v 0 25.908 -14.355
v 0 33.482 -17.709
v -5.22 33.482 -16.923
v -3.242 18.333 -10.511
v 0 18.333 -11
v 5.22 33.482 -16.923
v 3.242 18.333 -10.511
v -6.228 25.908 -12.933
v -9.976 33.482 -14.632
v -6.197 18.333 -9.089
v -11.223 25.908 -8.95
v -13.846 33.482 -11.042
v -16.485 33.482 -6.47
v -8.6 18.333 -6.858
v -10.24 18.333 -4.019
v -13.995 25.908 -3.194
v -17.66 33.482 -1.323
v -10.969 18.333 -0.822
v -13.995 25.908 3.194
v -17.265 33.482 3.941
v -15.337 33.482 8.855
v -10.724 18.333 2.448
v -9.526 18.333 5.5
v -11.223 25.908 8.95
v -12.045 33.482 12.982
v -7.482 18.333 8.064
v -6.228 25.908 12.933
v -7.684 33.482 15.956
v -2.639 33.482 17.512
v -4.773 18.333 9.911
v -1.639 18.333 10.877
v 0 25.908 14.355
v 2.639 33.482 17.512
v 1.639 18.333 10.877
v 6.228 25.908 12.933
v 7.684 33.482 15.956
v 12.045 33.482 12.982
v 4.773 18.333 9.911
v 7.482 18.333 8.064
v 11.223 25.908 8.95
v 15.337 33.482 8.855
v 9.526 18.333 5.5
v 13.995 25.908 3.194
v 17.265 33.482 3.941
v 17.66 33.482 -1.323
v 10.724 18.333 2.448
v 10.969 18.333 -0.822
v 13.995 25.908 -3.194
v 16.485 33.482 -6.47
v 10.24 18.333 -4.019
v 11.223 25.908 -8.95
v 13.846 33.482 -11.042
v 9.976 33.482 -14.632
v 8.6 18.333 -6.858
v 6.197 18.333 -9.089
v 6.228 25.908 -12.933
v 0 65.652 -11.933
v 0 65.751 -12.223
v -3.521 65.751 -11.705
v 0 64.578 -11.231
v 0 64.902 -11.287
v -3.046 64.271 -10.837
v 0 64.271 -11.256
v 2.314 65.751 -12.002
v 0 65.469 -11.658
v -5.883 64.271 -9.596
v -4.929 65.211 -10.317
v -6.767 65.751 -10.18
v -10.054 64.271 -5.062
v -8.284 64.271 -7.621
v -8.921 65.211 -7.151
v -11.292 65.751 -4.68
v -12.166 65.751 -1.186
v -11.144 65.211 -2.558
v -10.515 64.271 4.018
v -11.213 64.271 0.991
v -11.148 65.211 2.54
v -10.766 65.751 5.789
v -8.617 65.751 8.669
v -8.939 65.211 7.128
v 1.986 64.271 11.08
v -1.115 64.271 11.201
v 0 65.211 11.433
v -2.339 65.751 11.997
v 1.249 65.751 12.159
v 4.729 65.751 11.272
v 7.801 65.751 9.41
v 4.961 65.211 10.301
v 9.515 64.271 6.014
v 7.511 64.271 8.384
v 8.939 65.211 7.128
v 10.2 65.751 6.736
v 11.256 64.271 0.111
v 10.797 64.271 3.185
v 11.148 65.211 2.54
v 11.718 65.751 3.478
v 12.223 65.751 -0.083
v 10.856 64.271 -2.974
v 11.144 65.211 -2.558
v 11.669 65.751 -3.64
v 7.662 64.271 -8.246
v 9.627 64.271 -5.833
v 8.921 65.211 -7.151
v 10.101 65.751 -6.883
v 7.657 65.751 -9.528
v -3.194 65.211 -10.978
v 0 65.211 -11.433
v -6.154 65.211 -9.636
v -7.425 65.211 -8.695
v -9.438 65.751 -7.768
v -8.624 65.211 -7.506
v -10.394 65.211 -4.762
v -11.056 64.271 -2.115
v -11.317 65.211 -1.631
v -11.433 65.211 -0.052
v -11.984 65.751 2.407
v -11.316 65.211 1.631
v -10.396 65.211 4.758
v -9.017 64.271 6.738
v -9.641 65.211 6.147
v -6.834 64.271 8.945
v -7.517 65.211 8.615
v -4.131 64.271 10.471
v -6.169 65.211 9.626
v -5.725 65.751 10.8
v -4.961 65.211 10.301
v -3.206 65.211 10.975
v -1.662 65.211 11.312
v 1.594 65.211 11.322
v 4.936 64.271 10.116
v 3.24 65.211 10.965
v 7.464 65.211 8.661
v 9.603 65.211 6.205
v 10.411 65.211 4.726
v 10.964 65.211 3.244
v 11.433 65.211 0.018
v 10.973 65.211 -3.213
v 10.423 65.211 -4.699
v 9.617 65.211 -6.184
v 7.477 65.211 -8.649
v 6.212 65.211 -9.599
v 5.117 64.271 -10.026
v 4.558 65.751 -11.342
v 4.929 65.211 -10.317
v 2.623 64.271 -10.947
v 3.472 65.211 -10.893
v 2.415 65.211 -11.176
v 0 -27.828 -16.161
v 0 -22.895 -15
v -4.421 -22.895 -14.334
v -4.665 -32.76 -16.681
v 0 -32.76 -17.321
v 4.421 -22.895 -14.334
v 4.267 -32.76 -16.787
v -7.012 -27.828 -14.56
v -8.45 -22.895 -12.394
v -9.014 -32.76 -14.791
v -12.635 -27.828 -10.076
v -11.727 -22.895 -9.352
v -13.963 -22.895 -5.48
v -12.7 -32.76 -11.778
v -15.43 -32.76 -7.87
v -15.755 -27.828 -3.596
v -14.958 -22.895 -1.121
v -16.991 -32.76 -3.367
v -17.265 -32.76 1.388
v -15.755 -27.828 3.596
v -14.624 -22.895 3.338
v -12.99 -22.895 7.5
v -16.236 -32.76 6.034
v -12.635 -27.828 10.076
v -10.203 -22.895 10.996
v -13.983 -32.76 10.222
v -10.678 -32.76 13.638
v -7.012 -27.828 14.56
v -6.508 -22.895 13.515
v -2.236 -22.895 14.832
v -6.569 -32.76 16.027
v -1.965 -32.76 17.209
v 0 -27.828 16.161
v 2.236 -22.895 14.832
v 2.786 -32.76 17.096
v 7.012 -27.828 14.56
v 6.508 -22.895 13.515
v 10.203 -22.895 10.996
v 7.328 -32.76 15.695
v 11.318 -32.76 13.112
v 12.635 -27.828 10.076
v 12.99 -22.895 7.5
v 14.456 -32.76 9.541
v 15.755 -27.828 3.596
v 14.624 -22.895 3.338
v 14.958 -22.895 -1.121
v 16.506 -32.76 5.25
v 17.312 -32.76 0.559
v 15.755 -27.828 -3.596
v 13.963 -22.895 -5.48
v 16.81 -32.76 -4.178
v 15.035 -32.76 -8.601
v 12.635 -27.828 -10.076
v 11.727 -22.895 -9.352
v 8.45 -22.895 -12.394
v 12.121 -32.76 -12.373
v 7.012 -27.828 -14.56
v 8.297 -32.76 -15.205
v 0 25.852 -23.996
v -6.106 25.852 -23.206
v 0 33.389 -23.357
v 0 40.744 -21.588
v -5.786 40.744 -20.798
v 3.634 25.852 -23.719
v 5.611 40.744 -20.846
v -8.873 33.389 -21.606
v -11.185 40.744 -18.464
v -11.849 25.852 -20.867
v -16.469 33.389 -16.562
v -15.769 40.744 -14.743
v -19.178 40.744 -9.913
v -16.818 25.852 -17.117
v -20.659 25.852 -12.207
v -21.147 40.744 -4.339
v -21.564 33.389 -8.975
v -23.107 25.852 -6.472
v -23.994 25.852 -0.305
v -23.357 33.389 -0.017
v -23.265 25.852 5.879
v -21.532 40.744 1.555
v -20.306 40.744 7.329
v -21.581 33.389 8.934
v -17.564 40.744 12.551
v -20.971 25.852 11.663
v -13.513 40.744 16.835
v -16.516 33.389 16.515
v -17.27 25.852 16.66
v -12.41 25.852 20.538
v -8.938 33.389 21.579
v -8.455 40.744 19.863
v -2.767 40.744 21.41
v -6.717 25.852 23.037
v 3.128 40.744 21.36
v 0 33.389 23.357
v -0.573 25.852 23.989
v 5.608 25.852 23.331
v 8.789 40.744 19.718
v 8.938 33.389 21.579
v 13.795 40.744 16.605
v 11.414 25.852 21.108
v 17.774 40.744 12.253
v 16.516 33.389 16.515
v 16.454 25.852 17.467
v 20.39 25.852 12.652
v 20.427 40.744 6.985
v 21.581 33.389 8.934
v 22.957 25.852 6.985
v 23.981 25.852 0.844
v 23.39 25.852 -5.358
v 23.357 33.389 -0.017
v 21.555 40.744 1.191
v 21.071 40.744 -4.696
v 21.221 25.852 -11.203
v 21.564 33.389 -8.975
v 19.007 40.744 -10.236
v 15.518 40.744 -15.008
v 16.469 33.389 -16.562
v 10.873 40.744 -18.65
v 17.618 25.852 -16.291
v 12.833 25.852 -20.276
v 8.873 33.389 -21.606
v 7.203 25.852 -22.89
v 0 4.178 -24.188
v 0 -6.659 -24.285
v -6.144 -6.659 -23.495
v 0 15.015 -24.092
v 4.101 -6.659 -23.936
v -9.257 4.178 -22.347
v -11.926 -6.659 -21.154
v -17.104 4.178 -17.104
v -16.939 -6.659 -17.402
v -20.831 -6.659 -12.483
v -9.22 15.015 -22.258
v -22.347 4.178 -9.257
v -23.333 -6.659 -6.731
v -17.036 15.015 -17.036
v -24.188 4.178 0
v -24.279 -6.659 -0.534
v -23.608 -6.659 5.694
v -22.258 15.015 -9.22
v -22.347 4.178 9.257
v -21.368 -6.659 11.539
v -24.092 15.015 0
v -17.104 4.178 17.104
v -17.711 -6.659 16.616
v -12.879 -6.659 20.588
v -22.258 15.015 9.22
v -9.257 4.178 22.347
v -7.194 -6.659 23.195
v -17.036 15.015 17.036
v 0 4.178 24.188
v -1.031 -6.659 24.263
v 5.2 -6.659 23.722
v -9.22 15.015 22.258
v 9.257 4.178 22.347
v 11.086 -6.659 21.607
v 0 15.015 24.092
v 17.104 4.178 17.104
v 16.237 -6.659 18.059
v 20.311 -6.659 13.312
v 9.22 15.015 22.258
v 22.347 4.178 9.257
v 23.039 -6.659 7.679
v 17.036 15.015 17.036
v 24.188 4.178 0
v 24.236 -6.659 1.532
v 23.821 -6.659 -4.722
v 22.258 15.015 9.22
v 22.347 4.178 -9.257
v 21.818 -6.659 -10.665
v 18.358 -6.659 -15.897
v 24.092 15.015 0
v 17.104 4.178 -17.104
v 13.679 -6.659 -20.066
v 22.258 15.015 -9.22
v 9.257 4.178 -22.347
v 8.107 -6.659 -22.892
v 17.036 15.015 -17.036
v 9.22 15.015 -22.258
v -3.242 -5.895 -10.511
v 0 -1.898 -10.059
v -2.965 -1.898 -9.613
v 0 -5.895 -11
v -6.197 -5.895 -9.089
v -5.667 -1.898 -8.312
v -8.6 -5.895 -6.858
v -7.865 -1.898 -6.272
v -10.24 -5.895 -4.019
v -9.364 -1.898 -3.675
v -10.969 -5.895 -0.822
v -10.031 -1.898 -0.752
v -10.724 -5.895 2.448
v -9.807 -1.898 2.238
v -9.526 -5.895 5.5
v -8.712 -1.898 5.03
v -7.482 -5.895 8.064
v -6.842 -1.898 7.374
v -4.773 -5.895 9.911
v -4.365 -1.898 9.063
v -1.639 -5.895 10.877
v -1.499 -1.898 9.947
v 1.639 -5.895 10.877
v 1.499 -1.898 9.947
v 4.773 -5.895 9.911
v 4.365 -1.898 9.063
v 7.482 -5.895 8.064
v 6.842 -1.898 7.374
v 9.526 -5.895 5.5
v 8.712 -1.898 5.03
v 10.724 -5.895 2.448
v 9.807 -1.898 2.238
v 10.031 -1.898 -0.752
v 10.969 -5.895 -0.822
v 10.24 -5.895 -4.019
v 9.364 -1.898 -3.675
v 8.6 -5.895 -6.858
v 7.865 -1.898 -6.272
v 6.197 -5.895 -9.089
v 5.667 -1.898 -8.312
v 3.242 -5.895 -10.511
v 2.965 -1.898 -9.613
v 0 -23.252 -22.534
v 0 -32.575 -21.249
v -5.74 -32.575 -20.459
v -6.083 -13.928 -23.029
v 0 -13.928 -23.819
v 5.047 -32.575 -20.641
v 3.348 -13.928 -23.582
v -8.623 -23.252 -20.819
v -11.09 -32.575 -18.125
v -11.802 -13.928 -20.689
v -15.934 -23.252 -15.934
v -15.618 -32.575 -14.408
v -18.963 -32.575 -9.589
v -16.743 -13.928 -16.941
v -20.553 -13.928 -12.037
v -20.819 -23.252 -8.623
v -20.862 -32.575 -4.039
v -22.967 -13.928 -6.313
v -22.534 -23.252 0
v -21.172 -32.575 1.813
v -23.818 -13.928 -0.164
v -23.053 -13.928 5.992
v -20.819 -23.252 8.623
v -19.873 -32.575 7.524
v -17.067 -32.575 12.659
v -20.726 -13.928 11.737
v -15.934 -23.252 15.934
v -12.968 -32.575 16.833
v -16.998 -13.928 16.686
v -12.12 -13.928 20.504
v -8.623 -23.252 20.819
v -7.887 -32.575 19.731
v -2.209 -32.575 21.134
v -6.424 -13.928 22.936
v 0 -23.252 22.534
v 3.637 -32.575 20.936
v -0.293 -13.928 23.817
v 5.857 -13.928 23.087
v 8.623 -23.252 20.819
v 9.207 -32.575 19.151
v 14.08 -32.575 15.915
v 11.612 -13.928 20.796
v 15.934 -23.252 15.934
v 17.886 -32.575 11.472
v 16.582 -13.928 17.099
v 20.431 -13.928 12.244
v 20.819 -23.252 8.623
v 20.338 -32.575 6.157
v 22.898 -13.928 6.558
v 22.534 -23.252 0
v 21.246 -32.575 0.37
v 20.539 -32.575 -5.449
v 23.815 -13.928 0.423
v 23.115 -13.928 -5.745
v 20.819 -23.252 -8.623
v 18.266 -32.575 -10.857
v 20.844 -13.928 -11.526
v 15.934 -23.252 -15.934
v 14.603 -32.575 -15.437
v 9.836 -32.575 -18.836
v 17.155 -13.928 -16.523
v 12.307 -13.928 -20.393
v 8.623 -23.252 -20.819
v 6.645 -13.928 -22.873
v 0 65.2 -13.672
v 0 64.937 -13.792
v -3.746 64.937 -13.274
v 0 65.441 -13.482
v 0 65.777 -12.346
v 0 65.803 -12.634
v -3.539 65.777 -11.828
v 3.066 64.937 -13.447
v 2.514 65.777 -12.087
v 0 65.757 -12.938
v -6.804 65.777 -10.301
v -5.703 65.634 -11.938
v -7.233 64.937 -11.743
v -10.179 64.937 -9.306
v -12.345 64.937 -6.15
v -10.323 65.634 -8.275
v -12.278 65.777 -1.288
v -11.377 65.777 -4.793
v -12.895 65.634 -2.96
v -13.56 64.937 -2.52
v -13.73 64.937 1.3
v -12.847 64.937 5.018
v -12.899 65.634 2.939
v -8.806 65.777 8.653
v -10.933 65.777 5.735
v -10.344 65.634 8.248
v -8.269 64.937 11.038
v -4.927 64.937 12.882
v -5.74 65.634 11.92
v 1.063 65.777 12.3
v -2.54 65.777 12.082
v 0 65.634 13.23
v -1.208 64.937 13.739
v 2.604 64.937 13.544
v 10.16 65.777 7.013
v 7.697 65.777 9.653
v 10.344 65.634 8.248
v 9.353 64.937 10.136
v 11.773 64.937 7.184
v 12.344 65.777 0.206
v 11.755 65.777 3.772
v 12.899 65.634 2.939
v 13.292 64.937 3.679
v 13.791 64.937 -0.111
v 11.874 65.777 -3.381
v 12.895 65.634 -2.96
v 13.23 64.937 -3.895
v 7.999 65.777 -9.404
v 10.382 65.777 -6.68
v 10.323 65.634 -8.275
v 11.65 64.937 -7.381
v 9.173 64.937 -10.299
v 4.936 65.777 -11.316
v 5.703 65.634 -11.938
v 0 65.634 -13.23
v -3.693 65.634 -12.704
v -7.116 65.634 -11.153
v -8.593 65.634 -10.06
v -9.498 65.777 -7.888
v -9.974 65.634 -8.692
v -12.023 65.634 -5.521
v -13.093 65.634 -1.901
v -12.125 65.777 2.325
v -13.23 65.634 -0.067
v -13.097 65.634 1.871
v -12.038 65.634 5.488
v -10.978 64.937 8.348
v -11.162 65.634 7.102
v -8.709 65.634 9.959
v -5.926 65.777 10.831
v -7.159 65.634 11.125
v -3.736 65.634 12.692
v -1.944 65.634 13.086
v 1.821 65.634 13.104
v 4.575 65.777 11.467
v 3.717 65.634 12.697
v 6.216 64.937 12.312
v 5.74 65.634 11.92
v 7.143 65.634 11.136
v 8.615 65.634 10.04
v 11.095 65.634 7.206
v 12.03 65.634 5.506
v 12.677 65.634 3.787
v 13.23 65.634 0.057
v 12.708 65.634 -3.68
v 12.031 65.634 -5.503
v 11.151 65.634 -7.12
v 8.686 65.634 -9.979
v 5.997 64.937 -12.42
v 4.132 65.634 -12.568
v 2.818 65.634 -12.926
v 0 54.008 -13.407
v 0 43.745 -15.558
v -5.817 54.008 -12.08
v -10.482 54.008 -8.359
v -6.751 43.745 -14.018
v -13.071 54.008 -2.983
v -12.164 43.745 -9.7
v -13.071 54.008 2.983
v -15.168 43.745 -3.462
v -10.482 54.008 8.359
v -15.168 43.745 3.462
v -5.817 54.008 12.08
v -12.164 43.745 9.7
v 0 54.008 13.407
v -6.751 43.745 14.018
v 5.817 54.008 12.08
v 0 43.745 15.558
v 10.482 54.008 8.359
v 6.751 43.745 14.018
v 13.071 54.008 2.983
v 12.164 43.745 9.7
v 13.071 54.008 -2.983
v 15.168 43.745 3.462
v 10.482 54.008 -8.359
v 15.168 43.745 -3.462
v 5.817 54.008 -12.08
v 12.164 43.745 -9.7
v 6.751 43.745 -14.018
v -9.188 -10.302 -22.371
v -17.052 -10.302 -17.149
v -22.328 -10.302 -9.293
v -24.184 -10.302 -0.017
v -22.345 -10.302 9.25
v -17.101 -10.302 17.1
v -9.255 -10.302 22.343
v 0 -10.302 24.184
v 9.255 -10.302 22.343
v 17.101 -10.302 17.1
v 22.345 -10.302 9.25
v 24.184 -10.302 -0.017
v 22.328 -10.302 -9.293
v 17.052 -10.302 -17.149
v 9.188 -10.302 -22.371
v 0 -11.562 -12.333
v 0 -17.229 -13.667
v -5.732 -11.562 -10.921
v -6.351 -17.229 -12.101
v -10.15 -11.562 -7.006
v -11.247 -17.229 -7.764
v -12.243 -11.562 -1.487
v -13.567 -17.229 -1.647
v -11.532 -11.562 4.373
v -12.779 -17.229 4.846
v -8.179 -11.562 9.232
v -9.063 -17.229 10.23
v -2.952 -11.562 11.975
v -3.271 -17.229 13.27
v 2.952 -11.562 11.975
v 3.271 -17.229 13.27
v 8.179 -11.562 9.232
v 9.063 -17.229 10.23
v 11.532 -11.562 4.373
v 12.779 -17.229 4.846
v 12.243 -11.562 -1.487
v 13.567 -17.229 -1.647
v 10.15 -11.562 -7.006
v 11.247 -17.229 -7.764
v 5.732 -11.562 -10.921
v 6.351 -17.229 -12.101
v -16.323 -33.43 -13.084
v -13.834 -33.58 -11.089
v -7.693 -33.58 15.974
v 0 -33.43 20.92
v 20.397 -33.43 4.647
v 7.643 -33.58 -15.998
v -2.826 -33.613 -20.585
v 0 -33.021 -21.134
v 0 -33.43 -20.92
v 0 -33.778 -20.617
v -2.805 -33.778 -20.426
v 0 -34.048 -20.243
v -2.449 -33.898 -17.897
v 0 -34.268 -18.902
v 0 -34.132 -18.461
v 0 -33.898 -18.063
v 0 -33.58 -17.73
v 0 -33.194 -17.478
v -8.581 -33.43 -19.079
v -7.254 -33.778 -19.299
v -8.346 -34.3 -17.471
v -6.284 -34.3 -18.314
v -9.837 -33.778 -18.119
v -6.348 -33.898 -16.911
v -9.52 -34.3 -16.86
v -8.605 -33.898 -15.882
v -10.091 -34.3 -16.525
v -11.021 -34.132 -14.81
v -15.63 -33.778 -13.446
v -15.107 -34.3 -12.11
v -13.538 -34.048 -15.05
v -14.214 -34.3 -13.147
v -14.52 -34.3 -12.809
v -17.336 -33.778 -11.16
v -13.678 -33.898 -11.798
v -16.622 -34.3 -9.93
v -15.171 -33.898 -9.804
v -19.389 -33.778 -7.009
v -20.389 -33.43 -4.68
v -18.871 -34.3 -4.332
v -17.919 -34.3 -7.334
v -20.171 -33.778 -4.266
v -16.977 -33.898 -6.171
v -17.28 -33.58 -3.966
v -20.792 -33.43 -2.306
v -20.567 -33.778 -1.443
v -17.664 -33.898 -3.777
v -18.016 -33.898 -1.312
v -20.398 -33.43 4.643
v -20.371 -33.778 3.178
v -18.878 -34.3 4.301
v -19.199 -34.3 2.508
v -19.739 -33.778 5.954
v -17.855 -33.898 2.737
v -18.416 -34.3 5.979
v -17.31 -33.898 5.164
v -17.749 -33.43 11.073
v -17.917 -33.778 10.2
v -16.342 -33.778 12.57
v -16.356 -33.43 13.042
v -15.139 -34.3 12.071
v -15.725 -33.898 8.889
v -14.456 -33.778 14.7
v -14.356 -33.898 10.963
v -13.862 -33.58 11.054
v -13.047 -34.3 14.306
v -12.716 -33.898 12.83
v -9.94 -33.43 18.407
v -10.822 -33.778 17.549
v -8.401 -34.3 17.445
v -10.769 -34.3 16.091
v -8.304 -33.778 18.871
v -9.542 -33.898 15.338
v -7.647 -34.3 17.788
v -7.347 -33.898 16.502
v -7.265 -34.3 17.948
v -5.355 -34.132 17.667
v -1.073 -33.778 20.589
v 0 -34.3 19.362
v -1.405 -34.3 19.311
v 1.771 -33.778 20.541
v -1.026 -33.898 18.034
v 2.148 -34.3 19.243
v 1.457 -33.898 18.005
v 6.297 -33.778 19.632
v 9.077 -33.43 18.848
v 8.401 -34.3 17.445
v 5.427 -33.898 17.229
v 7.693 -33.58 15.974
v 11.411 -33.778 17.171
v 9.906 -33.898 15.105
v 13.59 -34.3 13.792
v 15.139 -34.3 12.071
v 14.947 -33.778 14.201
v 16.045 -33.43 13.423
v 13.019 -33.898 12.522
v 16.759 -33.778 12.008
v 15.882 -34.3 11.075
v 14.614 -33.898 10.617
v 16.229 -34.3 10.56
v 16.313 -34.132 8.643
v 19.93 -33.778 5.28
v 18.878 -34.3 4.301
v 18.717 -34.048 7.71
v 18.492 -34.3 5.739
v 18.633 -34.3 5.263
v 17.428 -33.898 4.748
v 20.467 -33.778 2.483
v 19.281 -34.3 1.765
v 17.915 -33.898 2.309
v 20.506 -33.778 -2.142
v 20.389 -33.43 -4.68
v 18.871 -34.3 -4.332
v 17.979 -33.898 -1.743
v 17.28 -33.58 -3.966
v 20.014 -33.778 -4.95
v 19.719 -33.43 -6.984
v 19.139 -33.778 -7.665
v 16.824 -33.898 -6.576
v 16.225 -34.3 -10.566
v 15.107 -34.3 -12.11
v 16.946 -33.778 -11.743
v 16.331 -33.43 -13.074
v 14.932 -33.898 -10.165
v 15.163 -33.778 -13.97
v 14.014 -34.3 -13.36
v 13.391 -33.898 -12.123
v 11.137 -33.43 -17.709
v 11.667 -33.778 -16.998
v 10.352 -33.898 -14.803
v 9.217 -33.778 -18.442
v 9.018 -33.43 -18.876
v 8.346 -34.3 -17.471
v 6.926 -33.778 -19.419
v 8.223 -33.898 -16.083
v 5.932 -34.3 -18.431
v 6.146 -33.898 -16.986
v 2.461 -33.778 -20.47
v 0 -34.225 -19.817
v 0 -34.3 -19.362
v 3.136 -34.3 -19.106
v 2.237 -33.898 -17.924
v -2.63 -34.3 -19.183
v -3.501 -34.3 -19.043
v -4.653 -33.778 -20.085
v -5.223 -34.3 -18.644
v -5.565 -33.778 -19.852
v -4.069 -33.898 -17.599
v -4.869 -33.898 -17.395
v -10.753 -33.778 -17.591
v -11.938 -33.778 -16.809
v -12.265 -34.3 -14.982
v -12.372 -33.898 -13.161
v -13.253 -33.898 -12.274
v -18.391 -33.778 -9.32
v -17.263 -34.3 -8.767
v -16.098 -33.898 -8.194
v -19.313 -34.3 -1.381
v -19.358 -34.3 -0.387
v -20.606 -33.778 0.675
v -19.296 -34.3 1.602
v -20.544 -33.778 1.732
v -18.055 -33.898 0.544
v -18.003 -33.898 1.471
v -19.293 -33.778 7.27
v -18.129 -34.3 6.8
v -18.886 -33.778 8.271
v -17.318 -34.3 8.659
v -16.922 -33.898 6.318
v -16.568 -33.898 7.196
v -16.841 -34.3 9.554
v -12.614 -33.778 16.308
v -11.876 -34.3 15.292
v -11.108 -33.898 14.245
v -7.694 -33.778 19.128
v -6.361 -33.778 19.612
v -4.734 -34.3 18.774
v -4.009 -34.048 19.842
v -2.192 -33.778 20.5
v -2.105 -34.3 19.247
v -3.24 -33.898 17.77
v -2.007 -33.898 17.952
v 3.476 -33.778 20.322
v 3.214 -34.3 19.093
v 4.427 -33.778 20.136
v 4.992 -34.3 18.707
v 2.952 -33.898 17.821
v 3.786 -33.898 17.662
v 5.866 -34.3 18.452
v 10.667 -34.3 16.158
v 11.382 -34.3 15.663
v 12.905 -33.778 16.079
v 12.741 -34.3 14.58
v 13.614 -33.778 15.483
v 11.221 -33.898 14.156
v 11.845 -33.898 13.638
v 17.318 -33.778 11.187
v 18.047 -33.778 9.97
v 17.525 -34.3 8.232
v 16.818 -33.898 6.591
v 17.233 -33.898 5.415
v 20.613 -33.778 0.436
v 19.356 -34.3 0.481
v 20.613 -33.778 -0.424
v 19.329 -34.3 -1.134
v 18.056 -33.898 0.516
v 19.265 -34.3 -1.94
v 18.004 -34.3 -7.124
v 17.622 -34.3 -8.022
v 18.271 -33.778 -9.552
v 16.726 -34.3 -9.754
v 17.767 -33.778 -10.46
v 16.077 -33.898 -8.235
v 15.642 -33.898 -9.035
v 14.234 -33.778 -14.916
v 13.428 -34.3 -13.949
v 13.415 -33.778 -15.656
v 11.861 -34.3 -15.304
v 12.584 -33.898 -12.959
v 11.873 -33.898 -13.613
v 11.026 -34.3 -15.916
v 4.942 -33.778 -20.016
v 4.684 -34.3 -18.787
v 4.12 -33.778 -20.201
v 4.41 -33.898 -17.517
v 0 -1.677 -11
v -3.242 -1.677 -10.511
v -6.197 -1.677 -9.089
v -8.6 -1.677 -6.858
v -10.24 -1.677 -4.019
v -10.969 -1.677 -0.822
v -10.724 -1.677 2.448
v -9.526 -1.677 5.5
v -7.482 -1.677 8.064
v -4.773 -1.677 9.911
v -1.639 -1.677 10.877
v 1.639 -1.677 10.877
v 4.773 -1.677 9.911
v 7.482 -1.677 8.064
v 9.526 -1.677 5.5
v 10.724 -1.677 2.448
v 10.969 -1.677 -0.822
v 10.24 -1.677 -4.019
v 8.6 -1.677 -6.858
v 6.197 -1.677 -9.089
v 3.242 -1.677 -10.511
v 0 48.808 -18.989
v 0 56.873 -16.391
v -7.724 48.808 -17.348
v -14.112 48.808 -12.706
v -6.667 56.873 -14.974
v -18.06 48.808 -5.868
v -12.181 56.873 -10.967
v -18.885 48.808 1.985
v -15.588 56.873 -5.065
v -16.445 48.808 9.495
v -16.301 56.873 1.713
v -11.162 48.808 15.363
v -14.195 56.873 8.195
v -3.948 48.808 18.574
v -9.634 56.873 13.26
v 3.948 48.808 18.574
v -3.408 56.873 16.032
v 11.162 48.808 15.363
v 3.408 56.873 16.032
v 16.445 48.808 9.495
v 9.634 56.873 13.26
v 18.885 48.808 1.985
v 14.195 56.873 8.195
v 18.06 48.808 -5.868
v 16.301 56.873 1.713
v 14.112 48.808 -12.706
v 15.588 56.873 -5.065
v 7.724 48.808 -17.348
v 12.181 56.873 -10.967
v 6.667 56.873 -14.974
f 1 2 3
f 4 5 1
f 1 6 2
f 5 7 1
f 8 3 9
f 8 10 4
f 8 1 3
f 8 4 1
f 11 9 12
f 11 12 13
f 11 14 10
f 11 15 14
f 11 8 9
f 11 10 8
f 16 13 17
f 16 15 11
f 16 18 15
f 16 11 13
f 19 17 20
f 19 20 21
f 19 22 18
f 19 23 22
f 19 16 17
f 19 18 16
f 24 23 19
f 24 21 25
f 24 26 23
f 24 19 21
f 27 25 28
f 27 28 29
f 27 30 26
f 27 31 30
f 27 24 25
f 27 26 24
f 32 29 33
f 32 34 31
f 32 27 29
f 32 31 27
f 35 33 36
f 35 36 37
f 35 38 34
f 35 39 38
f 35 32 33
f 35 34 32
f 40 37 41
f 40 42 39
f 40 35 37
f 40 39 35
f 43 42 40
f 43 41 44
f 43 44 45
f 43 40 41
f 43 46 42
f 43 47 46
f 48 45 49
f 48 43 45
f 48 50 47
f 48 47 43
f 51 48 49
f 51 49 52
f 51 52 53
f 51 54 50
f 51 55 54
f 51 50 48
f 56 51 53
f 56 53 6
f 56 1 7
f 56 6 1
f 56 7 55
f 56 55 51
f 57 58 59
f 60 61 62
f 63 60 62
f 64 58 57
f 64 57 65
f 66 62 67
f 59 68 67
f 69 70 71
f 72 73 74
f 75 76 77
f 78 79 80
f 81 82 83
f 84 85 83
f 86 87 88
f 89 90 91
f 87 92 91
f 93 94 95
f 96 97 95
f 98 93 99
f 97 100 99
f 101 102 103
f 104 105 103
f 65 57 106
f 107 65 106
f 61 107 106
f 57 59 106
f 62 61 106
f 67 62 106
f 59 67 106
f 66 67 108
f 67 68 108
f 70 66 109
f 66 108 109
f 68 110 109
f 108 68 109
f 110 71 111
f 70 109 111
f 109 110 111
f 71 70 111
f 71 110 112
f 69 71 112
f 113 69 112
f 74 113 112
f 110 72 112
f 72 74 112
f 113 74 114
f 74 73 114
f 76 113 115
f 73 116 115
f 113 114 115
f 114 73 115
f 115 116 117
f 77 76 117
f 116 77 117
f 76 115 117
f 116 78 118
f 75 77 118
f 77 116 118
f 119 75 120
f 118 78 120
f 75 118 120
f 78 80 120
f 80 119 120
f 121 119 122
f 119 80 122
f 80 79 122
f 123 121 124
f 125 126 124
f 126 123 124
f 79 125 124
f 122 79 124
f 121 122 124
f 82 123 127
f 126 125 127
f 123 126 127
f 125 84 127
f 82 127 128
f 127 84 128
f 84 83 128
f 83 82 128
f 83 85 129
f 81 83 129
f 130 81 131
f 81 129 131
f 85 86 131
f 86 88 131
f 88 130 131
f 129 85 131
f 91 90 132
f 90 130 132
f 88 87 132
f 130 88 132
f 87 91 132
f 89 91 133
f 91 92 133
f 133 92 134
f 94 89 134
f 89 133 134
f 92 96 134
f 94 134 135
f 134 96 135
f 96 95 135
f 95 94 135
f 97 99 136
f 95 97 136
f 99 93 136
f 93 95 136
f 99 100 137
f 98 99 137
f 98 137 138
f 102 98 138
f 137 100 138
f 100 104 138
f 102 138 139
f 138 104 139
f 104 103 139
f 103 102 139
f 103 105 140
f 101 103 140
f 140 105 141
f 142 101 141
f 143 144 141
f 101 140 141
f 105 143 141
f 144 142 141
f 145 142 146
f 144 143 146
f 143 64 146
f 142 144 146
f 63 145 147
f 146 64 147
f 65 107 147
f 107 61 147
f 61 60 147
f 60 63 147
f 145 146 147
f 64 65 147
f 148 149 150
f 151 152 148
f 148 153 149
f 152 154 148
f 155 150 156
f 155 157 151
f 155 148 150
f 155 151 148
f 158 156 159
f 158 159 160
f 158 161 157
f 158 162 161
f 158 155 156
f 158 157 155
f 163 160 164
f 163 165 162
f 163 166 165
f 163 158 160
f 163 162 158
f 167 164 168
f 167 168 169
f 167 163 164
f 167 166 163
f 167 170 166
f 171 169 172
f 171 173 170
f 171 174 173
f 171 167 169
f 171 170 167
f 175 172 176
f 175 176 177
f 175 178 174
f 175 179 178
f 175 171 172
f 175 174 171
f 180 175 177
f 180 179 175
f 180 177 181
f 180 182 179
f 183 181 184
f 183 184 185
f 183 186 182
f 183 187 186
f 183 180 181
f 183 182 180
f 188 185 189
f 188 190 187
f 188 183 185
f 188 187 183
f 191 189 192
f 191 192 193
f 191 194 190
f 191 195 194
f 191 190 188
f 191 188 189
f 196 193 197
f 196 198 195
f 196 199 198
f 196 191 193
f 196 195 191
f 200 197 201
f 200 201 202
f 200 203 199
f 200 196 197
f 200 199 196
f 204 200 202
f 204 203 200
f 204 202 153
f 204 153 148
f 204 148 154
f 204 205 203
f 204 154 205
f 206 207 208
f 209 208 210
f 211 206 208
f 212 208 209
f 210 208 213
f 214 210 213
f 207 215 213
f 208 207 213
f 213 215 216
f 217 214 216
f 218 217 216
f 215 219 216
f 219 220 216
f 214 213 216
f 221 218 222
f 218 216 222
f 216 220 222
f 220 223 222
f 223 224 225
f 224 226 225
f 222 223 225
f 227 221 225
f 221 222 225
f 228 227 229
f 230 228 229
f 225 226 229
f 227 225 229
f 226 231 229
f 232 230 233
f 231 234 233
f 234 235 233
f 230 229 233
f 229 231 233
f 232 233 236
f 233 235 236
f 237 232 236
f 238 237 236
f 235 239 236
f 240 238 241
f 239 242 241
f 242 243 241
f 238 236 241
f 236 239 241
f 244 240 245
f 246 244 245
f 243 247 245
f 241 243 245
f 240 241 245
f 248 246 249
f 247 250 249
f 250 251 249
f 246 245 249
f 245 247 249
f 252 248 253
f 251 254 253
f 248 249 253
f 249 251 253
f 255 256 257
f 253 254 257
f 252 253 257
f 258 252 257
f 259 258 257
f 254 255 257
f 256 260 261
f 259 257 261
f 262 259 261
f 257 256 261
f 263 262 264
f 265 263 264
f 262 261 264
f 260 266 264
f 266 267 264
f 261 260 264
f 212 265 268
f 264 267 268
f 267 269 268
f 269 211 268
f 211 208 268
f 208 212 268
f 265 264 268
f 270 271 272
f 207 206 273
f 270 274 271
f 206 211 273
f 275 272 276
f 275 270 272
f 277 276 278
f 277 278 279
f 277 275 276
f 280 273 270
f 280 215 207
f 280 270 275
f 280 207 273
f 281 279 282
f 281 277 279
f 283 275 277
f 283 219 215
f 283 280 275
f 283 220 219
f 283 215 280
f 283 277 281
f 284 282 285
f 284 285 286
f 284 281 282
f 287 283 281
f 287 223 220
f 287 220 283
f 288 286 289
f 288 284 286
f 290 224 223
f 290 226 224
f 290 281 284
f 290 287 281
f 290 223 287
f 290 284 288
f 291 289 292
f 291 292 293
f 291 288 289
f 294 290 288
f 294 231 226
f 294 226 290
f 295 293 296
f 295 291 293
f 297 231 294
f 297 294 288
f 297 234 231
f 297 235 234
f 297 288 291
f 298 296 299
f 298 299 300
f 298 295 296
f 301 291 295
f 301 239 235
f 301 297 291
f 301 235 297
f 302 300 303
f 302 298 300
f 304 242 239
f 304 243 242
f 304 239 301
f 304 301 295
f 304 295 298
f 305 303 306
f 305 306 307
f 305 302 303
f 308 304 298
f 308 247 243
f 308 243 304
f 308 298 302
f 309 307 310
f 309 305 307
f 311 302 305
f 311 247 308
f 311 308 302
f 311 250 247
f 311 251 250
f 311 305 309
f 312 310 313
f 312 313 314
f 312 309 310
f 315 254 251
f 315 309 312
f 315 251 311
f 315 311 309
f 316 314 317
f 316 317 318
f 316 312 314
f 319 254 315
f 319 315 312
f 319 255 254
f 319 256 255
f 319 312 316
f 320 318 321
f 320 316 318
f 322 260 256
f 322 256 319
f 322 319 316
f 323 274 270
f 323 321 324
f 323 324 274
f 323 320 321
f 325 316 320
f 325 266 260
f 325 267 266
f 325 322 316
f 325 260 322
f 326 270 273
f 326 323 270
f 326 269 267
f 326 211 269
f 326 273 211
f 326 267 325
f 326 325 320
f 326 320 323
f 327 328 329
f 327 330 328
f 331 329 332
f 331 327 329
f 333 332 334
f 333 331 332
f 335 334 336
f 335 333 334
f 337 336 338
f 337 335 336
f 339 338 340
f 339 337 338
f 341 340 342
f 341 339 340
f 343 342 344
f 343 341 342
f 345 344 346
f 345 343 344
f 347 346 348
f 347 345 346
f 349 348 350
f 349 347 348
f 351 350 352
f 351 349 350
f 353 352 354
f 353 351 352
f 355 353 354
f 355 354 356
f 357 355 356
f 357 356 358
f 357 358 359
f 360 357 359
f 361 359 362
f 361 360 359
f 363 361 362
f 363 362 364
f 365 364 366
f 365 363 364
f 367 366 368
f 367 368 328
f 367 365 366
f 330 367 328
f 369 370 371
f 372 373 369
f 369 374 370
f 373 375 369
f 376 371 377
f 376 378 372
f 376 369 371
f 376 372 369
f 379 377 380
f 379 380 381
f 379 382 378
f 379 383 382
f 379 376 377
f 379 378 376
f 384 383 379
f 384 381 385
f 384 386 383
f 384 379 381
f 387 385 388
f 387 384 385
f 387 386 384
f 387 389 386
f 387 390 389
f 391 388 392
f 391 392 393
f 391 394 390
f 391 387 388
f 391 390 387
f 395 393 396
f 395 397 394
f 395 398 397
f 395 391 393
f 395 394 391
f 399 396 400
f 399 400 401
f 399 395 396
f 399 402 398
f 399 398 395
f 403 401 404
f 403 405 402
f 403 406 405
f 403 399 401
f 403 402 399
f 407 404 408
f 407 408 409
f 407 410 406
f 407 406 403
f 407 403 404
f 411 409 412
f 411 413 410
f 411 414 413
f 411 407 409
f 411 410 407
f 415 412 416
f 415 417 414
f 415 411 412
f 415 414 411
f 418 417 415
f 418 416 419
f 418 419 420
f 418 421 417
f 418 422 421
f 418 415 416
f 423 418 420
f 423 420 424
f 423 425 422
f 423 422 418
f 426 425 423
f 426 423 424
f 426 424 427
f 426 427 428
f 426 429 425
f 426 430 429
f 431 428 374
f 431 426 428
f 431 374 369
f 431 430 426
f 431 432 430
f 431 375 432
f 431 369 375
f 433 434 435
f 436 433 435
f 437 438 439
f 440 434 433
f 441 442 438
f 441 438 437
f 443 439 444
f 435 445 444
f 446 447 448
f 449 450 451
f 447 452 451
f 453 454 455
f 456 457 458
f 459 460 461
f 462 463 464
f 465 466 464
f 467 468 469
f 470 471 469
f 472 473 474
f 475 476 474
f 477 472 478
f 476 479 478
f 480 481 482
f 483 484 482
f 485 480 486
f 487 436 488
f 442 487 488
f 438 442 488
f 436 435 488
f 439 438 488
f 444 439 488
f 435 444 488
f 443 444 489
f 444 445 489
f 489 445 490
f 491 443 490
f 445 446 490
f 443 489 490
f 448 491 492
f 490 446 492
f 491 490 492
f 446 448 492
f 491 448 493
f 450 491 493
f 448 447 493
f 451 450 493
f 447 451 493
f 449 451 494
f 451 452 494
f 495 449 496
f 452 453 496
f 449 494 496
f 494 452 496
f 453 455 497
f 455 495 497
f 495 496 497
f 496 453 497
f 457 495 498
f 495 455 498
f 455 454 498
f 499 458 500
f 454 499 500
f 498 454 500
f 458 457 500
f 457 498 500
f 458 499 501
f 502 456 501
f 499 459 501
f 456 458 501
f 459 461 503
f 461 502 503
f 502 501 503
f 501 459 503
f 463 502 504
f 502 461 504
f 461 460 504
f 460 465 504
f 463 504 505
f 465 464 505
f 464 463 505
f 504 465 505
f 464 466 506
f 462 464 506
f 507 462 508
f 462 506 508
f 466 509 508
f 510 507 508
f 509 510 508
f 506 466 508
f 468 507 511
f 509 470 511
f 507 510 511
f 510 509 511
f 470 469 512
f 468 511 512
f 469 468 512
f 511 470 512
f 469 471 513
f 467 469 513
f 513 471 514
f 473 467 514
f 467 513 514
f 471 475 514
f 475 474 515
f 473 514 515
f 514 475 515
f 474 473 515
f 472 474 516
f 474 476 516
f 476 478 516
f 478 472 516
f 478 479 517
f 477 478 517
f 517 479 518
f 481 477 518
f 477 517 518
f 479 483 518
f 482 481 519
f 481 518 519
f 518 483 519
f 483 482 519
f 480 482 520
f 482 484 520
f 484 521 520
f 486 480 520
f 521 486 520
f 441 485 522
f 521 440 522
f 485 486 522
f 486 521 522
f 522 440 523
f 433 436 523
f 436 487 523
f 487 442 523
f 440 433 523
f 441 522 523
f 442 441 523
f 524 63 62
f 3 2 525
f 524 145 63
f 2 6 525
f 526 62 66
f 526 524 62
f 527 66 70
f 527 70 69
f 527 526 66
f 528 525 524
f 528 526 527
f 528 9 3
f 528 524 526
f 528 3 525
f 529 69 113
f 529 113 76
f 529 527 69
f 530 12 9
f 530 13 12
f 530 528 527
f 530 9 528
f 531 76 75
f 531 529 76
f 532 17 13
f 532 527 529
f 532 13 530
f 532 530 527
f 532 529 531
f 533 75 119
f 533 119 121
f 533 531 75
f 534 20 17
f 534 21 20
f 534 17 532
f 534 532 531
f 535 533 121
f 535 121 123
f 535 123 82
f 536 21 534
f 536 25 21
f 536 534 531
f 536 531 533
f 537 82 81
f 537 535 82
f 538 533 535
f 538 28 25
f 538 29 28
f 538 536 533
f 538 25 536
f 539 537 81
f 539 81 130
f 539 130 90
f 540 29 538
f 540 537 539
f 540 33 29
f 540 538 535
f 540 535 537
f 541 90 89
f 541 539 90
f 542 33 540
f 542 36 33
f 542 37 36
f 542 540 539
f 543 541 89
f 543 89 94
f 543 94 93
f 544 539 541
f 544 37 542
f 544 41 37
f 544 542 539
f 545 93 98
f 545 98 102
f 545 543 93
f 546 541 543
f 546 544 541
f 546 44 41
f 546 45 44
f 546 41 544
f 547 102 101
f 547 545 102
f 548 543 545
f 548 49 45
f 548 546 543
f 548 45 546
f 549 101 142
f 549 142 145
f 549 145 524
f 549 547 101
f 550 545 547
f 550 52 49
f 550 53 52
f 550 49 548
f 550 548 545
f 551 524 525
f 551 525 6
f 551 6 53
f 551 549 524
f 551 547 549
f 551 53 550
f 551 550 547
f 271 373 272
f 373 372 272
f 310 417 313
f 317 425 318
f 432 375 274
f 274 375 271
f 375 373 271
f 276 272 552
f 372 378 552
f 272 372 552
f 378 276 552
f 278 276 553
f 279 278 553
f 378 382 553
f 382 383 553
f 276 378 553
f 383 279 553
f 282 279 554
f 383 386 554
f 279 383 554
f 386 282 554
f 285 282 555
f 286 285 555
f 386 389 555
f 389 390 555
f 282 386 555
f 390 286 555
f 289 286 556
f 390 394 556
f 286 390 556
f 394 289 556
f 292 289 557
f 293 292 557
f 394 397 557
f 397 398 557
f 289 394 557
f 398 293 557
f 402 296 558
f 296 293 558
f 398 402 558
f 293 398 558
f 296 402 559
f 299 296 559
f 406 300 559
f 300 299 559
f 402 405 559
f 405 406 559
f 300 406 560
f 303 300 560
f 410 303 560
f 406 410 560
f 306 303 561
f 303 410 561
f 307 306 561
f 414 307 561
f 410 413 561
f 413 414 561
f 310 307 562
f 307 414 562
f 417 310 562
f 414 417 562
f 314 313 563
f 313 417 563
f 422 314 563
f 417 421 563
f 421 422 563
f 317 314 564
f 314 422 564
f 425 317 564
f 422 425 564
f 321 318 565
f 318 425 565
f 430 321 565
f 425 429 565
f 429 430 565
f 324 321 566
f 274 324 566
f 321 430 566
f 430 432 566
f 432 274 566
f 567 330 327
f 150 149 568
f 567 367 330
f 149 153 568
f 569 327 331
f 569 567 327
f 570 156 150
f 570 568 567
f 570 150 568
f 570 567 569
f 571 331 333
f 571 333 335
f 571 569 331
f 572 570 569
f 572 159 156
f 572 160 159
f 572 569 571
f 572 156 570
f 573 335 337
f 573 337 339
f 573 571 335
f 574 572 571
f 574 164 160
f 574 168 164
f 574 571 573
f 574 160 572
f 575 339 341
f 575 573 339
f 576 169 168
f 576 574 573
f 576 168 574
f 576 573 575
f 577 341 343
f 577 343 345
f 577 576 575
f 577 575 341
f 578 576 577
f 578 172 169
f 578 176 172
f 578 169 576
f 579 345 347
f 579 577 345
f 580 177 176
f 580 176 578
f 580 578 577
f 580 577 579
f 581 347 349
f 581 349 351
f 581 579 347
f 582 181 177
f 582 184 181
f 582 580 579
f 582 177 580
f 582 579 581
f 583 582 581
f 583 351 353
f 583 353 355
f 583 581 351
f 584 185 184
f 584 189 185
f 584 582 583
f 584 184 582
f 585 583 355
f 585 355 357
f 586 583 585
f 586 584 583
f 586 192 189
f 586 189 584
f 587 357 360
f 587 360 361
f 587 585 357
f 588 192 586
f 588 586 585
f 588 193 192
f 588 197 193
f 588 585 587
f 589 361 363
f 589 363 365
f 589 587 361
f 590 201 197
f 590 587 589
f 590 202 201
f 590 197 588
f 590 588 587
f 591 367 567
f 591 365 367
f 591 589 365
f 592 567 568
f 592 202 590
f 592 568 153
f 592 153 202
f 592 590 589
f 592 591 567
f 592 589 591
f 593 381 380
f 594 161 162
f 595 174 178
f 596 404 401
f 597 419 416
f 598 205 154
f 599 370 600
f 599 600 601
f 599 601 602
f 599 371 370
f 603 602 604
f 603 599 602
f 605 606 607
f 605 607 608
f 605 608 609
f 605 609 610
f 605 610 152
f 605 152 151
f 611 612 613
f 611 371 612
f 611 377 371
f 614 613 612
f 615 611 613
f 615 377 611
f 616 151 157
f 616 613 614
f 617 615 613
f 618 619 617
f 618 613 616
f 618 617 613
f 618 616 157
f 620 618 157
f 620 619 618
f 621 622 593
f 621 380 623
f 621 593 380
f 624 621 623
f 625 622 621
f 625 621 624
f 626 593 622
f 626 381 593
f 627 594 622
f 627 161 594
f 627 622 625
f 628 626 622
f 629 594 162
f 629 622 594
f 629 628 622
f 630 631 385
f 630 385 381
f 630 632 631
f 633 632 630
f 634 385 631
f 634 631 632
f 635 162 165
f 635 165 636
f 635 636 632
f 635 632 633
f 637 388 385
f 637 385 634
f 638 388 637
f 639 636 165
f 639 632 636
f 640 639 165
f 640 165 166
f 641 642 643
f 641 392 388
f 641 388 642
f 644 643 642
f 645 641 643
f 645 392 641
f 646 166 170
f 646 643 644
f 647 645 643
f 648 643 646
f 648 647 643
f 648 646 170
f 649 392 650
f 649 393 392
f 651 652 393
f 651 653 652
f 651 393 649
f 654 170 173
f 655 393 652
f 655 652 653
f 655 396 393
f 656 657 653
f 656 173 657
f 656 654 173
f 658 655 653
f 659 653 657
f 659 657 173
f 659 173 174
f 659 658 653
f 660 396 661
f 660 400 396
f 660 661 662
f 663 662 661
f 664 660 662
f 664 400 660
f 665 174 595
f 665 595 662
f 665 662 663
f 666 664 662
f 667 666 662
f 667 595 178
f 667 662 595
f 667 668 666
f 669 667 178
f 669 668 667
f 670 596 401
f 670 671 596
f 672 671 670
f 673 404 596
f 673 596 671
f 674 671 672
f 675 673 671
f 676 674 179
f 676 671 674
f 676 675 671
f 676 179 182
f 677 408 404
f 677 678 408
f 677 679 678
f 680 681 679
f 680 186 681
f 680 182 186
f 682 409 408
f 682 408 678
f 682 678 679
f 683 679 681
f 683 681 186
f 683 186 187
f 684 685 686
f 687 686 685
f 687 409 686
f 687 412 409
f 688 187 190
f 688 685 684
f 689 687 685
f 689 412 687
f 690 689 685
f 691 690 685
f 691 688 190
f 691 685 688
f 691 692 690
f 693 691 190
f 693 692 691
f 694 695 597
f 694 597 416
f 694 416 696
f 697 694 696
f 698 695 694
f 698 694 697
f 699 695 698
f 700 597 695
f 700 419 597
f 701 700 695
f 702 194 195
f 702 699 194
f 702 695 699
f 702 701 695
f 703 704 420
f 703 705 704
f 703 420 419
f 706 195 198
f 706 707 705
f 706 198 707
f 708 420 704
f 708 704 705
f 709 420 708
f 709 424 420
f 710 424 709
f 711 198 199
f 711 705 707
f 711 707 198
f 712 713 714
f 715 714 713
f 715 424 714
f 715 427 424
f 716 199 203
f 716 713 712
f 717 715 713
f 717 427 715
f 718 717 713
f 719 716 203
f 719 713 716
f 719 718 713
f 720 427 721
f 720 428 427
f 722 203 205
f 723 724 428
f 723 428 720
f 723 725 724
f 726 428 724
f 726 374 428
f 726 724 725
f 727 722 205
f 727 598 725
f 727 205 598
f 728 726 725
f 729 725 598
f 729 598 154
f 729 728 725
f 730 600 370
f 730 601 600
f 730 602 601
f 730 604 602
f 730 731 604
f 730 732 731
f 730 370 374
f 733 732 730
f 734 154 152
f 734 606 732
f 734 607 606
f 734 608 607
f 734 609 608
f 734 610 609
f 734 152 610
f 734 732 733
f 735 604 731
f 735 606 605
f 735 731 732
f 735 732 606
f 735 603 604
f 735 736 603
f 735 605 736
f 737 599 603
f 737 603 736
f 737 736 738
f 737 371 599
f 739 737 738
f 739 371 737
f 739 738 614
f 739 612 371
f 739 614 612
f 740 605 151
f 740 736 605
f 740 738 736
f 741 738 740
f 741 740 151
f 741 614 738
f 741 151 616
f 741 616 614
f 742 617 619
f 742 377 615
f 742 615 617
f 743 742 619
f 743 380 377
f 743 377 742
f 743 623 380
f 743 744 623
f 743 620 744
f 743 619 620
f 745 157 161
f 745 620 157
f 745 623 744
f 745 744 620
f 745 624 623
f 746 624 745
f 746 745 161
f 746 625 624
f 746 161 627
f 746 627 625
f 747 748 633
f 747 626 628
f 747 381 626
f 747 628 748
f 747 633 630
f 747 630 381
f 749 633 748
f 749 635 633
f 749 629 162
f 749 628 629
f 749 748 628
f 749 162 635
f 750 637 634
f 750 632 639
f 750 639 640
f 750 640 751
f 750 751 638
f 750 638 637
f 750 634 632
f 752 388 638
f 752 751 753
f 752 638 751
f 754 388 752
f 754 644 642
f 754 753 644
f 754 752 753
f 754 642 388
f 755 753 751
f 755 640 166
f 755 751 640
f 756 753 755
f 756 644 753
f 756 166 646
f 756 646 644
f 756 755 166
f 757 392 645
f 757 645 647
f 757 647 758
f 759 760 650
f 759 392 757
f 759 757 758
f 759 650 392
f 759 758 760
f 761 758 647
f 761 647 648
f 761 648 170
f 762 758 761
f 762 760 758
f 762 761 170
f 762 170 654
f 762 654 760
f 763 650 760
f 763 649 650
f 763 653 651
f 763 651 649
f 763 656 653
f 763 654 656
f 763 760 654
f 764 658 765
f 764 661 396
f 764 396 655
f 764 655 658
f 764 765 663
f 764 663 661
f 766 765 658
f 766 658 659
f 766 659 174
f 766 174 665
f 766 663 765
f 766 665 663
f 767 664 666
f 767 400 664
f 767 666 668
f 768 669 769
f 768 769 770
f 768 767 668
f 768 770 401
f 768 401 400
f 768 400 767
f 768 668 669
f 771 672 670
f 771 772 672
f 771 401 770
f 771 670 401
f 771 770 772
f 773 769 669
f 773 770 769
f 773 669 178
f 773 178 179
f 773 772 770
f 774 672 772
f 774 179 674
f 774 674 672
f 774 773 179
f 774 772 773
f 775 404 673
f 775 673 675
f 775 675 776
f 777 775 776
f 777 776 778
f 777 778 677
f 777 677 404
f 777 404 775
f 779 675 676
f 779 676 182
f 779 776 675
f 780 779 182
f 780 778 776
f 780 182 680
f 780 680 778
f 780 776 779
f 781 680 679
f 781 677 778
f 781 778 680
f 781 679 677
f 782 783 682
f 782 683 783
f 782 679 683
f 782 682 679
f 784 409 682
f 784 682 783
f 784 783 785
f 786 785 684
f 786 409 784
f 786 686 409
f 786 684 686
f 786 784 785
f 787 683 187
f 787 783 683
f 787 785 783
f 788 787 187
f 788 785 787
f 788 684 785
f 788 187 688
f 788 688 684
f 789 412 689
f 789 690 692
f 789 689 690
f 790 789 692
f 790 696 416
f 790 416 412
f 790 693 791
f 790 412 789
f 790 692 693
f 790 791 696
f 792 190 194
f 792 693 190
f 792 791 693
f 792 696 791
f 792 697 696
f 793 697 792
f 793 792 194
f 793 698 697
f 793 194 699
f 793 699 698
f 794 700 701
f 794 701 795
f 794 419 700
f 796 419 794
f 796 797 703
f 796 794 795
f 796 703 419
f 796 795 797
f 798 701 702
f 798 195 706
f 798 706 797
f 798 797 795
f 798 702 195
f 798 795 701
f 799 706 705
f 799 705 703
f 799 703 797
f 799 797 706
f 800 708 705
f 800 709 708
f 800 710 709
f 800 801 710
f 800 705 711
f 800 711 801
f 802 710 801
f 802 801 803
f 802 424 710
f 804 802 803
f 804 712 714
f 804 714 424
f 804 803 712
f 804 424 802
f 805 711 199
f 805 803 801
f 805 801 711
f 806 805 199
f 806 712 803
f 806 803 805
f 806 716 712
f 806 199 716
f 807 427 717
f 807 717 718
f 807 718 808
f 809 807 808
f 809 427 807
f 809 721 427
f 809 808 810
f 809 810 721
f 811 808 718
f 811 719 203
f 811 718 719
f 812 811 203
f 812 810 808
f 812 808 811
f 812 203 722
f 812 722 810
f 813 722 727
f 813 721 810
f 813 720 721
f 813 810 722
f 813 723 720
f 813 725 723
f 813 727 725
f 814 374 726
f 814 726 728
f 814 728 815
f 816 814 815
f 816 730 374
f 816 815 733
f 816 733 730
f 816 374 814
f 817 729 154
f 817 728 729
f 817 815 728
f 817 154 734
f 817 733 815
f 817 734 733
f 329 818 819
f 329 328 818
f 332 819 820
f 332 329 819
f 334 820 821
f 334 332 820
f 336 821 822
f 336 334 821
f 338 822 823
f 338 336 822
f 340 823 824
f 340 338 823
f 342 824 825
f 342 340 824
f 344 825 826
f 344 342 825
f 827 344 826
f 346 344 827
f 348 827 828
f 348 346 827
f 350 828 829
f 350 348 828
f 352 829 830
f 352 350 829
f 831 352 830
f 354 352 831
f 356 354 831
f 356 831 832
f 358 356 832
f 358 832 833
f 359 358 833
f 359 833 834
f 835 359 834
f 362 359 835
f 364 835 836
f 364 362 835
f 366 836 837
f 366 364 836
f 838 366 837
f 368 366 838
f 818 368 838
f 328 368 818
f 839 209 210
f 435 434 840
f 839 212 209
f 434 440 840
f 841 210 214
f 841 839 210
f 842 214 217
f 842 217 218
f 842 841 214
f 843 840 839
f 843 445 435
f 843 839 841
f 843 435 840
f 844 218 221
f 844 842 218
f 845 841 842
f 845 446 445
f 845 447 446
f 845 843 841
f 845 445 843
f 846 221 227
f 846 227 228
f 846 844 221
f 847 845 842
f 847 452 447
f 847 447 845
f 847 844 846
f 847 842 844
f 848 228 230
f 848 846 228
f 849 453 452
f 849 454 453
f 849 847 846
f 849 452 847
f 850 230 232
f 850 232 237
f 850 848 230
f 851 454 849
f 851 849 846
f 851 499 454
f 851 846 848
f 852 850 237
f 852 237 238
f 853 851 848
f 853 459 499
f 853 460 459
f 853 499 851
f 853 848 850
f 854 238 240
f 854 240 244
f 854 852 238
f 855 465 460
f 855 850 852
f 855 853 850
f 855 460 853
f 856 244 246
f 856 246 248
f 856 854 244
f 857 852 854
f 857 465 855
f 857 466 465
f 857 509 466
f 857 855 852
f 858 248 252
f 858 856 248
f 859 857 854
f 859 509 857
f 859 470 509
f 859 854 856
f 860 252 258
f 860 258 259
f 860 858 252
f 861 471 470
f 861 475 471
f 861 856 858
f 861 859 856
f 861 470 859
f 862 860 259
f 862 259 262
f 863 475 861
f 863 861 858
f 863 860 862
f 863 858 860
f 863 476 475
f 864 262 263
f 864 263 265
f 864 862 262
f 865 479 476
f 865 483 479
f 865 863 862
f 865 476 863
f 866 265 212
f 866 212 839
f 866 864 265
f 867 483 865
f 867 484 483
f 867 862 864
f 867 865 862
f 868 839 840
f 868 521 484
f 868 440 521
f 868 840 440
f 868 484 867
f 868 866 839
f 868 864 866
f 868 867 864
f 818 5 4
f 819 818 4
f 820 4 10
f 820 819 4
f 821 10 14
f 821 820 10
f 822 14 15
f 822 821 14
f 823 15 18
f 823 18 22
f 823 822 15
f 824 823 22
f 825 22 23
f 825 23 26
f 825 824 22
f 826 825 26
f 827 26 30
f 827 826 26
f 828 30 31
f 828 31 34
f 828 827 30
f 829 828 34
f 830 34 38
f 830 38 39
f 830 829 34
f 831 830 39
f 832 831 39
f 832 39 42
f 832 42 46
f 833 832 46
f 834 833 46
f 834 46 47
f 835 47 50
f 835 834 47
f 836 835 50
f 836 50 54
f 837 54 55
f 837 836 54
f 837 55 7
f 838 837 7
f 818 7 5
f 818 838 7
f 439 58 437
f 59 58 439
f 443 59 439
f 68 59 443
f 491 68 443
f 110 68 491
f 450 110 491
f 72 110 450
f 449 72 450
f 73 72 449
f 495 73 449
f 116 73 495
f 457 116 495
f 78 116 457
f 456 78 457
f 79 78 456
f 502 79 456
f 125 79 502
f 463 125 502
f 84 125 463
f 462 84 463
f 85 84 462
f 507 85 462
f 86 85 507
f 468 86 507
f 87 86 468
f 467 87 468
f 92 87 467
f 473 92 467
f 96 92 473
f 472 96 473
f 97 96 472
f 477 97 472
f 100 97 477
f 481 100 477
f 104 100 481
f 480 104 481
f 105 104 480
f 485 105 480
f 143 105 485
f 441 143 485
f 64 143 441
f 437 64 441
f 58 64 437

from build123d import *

# Parameters (mm, degrees)
F2_R = 50
F3_R = 1.25
F4_R = 2


with BuildPart() as f1:
    # F0 (on Right) → F1 (revolve)
    with BuildSketch(Plane.YZ):
        Polygon((-22.895174, -15), (-43.220146, -19.782346), (-10.310824, -24.317097), (33.481894, -23.928402), (66.007544, -13.446839), (65.49473, -11), (33.481894, -17.709318), (18.333343, -11), (-1.676504, -11), (-5.895174, -11), align=None)
        Polygon((-1.897812, -10.059444), (-5.895174, -11), (-1.676504, -11), align=None)
    revolve(axis=Axis((0, 6.931687, 0), (0, 1, 0)))

    # F2
    f2_edges = [f1.edges().sort_by_distance(p)[0] for p in [
        (0, -10.310824, 24.317097),
        (0, 33.481894, 23.928402),
    ]]
    fillet(f2_edges, radius=F2_R)

    # F3
    f3_edges = [f1.edges().sort_by_distance(p)[0] for p in [
        (0, 66.007544, 13.446839),
        (0, 65.49473, 11),
        (0, 65.751137, -12.22342),
    ]]
    fillet(f3_edges, radius=F3_R)

    # F4
    f4_edges = [f1.edges().sort_by_distance(p)[0] for p in [
        (0, -43.220146, 19.782346),
    ]]
    fillet(f4_edges, radius=F4_R)


solid = f1.part
